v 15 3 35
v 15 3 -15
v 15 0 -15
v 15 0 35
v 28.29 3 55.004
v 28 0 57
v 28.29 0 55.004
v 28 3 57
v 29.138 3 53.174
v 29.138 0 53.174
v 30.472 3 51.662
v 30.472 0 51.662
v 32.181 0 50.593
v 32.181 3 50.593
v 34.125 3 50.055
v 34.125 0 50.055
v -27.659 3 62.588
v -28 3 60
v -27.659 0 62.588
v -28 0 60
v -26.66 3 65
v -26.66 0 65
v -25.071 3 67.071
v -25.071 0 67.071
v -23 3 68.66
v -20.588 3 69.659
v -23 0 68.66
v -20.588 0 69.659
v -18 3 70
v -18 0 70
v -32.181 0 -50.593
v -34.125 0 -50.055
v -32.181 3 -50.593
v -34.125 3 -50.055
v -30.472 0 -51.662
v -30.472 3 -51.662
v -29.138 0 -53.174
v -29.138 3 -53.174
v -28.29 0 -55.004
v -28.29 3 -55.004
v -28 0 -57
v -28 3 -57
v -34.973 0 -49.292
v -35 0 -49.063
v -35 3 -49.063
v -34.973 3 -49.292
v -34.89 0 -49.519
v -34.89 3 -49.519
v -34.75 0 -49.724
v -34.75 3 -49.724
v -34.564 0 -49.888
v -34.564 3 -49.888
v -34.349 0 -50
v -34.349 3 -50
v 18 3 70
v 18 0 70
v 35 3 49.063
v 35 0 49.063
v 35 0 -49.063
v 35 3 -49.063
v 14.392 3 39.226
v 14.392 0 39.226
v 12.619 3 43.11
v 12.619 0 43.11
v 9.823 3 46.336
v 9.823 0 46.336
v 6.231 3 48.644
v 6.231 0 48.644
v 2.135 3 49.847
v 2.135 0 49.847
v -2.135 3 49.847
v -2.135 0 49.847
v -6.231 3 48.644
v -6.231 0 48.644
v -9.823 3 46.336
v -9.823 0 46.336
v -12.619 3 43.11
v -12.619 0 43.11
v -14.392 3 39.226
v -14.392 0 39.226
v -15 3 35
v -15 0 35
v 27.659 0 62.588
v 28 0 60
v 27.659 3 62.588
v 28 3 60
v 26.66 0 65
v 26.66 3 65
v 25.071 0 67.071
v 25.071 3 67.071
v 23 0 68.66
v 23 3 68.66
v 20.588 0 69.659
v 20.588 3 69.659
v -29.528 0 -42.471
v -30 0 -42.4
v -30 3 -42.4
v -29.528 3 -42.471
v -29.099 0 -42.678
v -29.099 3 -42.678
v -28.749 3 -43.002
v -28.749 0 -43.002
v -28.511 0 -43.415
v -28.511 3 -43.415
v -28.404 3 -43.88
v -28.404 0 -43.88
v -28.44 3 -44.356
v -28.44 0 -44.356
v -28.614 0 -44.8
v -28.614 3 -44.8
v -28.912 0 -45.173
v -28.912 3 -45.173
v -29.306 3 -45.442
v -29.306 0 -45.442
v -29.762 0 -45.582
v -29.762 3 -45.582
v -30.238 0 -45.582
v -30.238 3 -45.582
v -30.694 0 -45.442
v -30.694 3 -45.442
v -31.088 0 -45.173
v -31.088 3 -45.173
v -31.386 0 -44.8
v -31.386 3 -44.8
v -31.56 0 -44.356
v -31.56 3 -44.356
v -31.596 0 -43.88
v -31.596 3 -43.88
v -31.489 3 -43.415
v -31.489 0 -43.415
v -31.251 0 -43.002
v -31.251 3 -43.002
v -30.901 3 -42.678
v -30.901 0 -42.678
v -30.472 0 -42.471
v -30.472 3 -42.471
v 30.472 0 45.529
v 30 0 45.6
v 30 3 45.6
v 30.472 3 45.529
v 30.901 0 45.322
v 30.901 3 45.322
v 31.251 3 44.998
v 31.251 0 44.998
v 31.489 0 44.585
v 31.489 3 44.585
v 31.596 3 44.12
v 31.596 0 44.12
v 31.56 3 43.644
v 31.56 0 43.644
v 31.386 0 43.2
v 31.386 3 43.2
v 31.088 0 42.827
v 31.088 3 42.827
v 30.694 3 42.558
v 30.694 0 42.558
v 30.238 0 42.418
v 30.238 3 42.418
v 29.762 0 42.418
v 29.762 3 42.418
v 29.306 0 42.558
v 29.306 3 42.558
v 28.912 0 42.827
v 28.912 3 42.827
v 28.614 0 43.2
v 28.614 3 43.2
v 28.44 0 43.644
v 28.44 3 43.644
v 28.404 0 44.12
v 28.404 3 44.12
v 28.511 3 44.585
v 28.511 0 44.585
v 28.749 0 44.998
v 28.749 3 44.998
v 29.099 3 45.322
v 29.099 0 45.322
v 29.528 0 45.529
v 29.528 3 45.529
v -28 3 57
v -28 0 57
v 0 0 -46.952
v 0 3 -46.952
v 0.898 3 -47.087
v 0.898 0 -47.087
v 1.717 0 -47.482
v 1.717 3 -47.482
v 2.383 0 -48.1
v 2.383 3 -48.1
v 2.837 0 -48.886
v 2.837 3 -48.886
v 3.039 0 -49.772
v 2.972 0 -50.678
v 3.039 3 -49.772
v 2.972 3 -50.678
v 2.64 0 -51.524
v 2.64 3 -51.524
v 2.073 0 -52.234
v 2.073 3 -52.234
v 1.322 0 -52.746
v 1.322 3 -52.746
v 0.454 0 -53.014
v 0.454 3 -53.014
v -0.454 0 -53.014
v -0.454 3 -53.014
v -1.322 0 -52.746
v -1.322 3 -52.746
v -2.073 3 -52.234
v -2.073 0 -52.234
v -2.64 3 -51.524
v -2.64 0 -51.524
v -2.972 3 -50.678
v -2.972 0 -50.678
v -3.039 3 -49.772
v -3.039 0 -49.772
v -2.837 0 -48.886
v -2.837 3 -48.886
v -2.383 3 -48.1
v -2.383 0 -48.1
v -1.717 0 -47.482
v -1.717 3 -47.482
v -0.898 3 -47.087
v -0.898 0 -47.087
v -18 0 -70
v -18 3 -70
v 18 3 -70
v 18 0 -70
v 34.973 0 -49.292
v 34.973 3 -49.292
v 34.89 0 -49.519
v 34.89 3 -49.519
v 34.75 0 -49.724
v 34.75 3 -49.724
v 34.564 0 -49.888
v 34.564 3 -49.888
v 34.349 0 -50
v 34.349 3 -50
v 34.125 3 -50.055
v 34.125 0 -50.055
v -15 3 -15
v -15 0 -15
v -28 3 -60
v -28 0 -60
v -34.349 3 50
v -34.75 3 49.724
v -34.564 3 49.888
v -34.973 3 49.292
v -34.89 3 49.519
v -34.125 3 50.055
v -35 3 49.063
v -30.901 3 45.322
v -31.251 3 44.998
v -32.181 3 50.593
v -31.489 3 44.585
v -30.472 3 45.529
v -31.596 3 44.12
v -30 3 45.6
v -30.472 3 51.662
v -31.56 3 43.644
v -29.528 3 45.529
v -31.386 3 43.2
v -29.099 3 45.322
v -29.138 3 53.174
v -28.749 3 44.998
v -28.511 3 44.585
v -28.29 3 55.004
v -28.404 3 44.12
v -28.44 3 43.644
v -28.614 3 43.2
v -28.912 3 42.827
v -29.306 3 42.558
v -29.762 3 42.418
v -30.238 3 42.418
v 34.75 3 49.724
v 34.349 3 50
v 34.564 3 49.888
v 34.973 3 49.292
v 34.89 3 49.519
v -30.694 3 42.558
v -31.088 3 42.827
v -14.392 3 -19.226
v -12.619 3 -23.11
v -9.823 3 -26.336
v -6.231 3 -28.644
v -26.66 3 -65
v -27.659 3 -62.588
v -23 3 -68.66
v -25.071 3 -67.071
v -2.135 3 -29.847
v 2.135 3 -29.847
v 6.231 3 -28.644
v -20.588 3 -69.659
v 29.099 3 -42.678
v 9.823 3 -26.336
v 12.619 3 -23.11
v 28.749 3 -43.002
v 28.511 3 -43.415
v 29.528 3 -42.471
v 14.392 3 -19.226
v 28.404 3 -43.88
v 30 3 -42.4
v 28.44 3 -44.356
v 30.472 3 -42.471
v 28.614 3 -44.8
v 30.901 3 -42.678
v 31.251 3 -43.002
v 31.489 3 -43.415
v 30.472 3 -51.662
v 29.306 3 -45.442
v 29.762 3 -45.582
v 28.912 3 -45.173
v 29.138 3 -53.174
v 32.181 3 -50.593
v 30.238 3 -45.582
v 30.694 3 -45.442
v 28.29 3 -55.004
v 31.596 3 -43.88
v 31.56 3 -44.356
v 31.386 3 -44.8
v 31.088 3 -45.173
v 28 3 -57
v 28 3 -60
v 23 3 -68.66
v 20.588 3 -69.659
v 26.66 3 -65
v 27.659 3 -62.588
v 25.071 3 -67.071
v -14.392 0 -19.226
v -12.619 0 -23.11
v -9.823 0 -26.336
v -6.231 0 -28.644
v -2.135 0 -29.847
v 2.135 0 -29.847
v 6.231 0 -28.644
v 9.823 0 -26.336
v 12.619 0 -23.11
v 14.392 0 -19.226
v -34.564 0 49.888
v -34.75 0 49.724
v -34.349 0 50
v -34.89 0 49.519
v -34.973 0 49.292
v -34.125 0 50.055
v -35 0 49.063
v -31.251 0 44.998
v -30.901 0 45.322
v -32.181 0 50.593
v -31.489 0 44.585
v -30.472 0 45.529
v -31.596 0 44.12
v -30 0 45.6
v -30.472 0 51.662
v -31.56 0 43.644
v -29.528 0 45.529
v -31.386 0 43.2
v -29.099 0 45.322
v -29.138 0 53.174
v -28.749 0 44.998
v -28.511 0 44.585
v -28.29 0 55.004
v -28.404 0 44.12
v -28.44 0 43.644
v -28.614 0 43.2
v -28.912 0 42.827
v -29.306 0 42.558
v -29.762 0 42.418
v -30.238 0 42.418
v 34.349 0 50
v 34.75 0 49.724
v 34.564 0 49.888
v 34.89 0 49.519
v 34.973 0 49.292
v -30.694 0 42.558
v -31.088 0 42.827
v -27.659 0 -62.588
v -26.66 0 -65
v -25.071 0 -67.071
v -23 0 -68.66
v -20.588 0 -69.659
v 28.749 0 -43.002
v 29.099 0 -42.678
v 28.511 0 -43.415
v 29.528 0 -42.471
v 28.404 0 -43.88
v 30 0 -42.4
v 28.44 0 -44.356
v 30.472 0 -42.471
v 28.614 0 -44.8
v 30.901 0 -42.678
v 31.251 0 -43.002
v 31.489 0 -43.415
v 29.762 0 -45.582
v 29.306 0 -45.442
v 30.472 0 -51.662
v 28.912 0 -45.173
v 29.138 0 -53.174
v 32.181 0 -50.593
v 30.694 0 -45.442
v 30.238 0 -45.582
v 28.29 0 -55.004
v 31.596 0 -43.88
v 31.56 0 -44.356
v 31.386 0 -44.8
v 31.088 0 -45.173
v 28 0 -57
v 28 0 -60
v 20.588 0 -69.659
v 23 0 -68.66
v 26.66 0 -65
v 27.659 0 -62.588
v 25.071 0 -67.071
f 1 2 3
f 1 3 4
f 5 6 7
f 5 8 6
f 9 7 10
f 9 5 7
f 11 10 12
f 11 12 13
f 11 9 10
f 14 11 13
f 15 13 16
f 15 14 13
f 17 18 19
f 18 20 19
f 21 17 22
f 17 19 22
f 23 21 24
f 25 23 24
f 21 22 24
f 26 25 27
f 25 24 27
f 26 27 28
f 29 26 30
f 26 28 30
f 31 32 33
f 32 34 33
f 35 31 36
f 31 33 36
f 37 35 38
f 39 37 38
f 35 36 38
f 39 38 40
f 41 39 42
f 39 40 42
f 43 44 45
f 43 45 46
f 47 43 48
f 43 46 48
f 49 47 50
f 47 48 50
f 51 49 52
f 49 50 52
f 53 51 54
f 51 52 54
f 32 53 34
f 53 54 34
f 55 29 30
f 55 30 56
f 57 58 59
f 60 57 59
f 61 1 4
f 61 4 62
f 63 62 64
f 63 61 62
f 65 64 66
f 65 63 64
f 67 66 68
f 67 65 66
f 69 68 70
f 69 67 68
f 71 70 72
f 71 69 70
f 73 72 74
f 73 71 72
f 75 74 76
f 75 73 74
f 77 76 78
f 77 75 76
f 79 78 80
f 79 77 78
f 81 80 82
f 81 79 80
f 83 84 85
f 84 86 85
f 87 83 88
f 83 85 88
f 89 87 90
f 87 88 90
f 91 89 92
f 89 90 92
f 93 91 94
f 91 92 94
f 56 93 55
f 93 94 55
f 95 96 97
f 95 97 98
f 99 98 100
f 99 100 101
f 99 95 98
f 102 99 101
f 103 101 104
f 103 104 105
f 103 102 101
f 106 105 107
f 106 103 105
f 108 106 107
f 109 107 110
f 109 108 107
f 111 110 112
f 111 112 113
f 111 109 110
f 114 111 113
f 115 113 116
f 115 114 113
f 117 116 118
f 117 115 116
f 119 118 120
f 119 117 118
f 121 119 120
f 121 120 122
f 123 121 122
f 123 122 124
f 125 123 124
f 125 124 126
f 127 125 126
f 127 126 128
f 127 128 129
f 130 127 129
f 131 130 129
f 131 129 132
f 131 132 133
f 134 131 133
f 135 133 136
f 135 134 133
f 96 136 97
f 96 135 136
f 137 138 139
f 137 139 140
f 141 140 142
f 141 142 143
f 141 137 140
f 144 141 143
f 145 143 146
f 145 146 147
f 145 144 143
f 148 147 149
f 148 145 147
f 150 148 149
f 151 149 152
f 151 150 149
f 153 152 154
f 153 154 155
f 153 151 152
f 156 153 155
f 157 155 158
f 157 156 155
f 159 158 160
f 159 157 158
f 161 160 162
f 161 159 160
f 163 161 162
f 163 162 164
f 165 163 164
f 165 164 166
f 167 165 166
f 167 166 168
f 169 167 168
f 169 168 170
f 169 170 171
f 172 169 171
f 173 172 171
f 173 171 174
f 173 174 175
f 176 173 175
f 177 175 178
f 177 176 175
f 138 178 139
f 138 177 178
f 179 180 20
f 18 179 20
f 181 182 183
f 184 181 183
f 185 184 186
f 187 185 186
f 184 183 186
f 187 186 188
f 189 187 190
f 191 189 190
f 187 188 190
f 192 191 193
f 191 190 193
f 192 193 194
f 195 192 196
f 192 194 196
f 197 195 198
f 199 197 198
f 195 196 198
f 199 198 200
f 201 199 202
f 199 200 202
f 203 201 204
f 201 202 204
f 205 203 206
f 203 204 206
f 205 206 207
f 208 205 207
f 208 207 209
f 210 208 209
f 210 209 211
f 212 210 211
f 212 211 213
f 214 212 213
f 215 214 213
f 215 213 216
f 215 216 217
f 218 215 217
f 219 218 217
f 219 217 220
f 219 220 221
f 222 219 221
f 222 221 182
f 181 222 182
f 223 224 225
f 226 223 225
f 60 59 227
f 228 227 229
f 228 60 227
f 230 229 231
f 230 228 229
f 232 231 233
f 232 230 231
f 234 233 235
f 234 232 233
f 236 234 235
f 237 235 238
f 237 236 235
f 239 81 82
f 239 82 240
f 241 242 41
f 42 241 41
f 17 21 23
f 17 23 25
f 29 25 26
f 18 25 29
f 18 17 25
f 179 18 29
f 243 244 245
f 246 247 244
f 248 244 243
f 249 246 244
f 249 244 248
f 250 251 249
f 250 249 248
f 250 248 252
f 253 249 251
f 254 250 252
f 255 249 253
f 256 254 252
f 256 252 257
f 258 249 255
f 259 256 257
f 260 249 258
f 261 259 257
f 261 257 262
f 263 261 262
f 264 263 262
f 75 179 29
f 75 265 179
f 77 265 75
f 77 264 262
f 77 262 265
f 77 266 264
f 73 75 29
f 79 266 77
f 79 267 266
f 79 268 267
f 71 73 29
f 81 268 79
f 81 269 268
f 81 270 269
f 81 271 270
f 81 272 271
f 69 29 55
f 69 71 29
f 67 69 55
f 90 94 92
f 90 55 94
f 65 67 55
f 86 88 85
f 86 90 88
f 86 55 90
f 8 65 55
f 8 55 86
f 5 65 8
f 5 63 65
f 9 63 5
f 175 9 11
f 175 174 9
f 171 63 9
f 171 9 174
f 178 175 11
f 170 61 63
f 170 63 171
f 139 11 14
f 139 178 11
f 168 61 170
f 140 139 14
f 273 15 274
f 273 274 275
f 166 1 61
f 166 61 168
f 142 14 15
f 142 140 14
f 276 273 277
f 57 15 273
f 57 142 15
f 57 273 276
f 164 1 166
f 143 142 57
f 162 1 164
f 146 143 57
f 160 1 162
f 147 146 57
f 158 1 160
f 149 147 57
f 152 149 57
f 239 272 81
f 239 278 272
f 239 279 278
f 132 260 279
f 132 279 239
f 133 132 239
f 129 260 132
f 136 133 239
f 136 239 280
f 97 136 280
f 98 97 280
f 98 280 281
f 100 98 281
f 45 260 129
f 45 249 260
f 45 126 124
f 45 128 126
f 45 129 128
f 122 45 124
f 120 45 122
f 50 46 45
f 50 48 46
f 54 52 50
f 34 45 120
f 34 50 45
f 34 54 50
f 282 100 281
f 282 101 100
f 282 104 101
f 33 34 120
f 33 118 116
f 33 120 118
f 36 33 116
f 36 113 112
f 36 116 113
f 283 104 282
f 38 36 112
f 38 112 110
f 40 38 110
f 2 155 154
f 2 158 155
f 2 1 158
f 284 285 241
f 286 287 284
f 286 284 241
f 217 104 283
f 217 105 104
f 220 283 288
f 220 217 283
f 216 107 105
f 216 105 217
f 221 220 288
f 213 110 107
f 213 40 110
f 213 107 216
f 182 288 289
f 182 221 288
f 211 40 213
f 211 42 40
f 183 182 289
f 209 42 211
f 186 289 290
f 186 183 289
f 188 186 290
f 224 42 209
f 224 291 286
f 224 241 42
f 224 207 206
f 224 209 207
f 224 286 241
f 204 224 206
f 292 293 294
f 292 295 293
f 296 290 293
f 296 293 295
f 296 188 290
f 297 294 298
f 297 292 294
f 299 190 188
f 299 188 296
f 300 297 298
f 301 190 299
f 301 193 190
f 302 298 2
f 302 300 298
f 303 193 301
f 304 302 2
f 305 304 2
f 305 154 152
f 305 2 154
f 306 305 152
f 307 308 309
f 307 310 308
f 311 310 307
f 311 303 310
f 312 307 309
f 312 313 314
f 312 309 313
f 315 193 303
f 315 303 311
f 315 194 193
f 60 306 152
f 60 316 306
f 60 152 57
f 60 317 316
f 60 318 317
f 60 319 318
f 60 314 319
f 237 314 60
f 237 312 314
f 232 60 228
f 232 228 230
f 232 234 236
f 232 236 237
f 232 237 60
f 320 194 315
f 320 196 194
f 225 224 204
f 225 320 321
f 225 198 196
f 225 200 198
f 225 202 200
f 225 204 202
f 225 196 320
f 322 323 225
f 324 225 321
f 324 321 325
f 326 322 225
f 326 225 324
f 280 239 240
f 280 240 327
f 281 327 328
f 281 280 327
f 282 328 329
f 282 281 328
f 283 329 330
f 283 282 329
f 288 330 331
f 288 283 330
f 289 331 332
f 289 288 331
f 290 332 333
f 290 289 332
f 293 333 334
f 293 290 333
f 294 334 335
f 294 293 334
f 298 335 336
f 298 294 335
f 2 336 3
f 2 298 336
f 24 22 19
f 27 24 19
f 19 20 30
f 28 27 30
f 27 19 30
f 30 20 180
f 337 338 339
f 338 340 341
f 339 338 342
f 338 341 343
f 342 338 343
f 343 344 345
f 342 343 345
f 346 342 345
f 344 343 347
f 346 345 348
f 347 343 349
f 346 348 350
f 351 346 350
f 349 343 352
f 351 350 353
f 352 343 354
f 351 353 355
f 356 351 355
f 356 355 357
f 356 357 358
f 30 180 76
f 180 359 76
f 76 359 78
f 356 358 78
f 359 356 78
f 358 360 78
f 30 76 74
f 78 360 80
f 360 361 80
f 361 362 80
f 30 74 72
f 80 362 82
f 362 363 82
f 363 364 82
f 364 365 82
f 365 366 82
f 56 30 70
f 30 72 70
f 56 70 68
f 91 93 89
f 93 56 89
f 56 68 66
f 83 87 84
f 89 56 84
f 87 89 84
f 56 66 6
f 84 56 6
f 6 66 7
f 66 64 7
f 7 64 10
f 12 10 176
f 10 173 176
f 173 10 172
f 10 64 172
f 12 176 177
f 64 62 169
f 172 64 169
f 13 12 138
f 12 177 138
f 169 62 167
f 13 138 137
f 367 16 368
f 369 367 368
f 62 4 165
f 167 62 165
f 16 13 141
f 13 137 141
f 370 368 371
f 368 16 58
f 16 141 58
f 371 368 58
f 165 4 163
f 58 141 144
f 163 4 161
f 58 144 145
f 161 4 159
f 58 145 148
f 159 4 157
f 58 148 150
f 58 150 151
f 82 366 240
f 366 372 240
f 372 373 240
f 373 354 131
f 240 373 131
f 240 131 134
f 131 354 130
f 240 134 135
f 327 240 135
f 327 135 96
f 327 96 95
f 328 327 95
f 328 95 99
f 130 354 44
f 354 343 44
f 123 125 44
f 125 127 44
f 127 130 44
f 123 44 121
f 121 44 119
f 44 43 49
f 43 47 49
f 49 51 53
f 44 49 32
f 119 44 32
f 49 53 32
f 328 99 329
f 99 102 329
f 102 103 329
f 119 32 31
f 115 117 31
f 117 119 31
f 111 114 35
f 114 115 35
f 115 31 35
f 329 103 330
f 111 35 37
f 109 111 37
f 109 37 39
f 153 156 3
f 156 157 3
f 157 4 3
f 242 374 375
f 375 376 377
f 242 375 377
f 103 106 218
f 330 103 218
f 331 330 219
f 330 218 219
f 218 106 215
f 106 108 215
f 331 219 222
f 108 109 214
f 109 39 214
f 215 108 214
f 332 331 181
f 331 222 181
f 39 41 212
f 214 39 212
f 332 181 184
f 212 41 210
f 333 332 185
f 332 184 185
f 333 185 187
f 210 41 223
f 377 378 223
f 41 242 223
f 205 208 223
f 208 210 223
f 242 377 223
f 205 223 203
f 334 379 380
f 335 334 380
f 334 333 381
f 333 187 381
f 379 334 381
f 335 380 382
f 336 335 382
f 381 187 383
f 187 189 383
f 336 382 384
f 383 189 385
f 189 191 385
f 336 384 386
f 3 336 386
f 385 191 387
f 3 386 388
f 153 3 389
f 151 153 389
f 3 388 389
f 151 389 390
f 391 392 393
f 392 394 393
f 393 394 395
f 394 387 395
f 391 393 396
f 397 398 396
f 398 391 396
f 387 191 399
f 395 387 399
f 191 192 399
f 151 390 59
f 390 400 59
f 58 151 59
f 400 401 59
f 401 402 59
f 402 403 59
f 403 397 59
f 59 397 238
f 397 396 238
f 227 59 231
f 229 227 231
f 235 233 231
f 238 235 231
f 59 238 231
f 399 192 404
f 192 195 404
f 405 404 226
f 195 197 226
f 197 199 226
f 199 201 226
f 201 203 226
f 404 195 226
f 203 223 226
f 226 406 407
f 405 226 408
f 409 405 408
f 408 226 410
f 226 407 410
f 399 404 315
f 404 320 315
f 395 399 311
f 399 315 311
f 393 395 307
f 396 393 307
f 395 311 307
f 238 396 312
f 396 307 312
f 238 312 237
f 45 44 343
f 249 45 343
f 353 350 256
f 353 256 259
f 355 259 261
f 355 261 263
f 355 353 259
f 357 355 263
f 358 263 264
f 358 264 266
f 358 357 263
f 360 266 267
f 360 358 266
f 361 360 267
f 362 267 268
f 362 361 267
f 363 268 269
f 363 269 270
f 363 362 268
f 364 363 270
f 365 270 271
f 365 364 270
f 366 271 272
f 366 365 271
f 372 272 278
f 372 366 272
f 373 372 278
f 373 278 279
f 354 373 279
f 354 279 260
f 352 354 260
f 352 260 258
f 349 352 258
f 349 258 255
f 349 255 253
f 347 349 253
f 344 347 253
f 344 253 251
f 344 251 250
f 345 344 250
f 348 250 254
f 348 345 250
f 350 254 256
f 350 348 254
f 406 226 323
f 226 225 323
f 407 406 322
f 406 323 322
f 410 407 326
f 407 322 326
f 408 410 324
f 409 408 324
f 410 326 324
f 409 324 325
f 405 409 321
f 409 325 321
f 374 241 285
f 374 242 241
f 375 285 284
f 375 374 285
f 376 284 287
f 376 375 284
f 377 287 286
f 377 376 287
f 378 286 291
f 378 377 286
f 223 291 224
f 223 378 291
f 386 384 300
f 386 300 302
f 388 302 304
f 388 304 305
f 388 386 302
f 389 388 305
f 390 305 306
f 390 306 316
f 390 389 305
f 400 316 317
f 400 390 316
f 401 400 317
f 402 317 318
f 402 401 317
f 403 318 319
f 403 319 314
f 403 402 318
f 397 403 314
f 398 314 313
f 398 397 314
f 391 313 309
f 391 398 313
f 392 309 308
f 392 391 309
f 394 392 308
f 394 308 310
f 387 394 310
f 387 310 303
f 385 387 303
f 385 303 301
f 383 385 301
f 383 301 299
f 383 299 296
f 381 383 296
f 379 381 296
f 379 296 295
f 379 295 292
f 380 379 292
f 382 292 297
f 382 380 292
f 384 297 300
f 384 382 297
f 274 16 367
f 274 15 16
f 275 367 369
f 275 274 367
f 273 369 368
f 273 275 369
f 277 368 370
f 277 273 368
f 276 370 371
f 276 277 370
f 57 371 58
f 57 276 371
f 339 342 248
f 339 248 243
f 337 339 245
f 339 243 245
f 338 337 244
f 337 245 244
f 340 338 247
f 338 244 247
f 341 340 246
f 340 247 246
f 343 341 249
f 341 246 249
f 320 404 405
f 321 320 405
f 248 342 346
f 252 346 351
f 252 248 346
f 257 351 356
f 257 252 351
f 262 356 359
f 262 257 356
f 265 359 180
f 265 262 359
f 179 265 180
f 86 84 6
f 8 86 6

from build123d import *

# Parameters (mm, degrees)
SKETCH1_R           = 1.6
BOSS_EXTRUDE1_DEPTH = 3
FILLET1_R           = 7
FILLET2_R           = 1
FILLET3_R           = 50
SKETCH2_W           = 59.626658502
SKETCH2_H           = 94.260753609
CUT_EXTRUDE1_DEPTH  = 10
FILLET4_R           = 10
SKETCH3_R           = 3.048
CUT_EXTRUDE2_DEPTH  = 10


with BuildPart() as part:
    # Sketch1 → Boss-Extrude1 (new body)
    with BuildSketch(Plane(origin=(0, 0, 0), x_dir=(1, 0, 0), z_dir=(0, 1, 0))):
        Polygon((-35, -50), (-28, -50), (-28, -132), (0, -144), (28, -132), (28, -50), (35, -50), (35, 50), (28, 50), (28, 132), (0, 144), (-28, 132), (-28, 50), (-35, 50), align=None)
        with Locations(Location((-30, 44, 0), (0, 0, 270))):
            Circle(SKETCH1_R, mode=Mode.SUBTRACT)
        with Locations(Location((30, 44, 0), (0, 0, 270))):
            Circle(SKETCH1_R, mode=Mode.SUBTRACT)
        with Locations(Location((30, -44, 0), (0, 0, 270))):
            Circle(SKETCH1_R, mode=Mode.SUBTRACT)
        with Locations(Location((-30, -44, 0), (0, 0, 270))):
            Circle(SKETCH1_R, mode=Mode.SUBTRACT)
    extrude(amount=BOSS_EXTRUDE1_DEPTH)

    # Fillet1
    fillet1_edges = [part.edges().sort_by_distance(p)[0] for p in [
        (-28, 1.5, 50),
        (28, 1.5, 50),
        (28, 1.5, -50),
        (-28, 1.5, -50),
    ]]
    fillet(fillet1_edges, radius=FILLET1_R - 0.0001)  # a hair under: the kernel refuses the full size

    # Fillet2
    fillet2_edges = [part.edges().sort_by_distance(p)[0] for p in [
        (35, 1.5, -50),
        (35, 1.5, 50),
        (-35, 1.5, 50),
        (-35, 1.5, -50),
    ]]
    fillet(fillet2_edges, radius=FILLET2_R)

    # Fillet3
    fillet3_edges = [part.edges().sort_by_distance(p)[0] for p in [
        (0, 1.5, 144),
        (0, 1.5, -144),
    ]]
    fillet(fillet3_edges, radius=FILLET3_R)

    # Sketch2 → Cut-Extrude1 (cut)
    with BuildSketch(Plane(origin=(0, 3, 0), x_dir=(1, 0, 0), z_dir=(0, 1, 0))):
        with Locations((1.813329251, 117.130376805)):
            Rectangle(SKETCH2_W, SKETCH2_H)
    cut_extrude1 = extrude(amount=-CUT_EXTRUDE1_DEPTH, mode=Mode.SUBTRACT)

    # Mirror1: Cut-Extrude1 across plane
    add(cut_extrude1.mirror(Plane.XY), mode=Mode.SUBTRACT)

    # Fillet4
    fillet4_edges = [part.edges().sort_by_distance(p)[0] for p in [
        (-28, 1.5, -70),
        (28, 1.5, -70),
        (28, 1.5, 70),
        (-28, 1.5, 70),
    ]]
    fillet(fillet4_edges, radius=FILLET4_R)

    # Sketch3 → Cut-Extrude2 (cut)
    with BuildSketch(Plane(origin=(0, 3, 0), x_dir=(1, 0, 0), z_dir=(0, 1, 0))):
        with Locations(Location((0, 50, 0), (0, 0, 270))):
            Circle(SKETCH3_R)
        with BuildLine():
            Line((15, 15), (15, -35))
            ThreePointArc((15, -35), (0, -50), (-15, -35))
            Line((-15, -35), (-15, 15))
            ThreePointArc((-15, 15), (0, 30), (15, 15))
        make_face()
    extrude(amount=-CUT_EXTRUDE2_DEPTH, mode=Mode.SUBTRACT)


solid = part.part
